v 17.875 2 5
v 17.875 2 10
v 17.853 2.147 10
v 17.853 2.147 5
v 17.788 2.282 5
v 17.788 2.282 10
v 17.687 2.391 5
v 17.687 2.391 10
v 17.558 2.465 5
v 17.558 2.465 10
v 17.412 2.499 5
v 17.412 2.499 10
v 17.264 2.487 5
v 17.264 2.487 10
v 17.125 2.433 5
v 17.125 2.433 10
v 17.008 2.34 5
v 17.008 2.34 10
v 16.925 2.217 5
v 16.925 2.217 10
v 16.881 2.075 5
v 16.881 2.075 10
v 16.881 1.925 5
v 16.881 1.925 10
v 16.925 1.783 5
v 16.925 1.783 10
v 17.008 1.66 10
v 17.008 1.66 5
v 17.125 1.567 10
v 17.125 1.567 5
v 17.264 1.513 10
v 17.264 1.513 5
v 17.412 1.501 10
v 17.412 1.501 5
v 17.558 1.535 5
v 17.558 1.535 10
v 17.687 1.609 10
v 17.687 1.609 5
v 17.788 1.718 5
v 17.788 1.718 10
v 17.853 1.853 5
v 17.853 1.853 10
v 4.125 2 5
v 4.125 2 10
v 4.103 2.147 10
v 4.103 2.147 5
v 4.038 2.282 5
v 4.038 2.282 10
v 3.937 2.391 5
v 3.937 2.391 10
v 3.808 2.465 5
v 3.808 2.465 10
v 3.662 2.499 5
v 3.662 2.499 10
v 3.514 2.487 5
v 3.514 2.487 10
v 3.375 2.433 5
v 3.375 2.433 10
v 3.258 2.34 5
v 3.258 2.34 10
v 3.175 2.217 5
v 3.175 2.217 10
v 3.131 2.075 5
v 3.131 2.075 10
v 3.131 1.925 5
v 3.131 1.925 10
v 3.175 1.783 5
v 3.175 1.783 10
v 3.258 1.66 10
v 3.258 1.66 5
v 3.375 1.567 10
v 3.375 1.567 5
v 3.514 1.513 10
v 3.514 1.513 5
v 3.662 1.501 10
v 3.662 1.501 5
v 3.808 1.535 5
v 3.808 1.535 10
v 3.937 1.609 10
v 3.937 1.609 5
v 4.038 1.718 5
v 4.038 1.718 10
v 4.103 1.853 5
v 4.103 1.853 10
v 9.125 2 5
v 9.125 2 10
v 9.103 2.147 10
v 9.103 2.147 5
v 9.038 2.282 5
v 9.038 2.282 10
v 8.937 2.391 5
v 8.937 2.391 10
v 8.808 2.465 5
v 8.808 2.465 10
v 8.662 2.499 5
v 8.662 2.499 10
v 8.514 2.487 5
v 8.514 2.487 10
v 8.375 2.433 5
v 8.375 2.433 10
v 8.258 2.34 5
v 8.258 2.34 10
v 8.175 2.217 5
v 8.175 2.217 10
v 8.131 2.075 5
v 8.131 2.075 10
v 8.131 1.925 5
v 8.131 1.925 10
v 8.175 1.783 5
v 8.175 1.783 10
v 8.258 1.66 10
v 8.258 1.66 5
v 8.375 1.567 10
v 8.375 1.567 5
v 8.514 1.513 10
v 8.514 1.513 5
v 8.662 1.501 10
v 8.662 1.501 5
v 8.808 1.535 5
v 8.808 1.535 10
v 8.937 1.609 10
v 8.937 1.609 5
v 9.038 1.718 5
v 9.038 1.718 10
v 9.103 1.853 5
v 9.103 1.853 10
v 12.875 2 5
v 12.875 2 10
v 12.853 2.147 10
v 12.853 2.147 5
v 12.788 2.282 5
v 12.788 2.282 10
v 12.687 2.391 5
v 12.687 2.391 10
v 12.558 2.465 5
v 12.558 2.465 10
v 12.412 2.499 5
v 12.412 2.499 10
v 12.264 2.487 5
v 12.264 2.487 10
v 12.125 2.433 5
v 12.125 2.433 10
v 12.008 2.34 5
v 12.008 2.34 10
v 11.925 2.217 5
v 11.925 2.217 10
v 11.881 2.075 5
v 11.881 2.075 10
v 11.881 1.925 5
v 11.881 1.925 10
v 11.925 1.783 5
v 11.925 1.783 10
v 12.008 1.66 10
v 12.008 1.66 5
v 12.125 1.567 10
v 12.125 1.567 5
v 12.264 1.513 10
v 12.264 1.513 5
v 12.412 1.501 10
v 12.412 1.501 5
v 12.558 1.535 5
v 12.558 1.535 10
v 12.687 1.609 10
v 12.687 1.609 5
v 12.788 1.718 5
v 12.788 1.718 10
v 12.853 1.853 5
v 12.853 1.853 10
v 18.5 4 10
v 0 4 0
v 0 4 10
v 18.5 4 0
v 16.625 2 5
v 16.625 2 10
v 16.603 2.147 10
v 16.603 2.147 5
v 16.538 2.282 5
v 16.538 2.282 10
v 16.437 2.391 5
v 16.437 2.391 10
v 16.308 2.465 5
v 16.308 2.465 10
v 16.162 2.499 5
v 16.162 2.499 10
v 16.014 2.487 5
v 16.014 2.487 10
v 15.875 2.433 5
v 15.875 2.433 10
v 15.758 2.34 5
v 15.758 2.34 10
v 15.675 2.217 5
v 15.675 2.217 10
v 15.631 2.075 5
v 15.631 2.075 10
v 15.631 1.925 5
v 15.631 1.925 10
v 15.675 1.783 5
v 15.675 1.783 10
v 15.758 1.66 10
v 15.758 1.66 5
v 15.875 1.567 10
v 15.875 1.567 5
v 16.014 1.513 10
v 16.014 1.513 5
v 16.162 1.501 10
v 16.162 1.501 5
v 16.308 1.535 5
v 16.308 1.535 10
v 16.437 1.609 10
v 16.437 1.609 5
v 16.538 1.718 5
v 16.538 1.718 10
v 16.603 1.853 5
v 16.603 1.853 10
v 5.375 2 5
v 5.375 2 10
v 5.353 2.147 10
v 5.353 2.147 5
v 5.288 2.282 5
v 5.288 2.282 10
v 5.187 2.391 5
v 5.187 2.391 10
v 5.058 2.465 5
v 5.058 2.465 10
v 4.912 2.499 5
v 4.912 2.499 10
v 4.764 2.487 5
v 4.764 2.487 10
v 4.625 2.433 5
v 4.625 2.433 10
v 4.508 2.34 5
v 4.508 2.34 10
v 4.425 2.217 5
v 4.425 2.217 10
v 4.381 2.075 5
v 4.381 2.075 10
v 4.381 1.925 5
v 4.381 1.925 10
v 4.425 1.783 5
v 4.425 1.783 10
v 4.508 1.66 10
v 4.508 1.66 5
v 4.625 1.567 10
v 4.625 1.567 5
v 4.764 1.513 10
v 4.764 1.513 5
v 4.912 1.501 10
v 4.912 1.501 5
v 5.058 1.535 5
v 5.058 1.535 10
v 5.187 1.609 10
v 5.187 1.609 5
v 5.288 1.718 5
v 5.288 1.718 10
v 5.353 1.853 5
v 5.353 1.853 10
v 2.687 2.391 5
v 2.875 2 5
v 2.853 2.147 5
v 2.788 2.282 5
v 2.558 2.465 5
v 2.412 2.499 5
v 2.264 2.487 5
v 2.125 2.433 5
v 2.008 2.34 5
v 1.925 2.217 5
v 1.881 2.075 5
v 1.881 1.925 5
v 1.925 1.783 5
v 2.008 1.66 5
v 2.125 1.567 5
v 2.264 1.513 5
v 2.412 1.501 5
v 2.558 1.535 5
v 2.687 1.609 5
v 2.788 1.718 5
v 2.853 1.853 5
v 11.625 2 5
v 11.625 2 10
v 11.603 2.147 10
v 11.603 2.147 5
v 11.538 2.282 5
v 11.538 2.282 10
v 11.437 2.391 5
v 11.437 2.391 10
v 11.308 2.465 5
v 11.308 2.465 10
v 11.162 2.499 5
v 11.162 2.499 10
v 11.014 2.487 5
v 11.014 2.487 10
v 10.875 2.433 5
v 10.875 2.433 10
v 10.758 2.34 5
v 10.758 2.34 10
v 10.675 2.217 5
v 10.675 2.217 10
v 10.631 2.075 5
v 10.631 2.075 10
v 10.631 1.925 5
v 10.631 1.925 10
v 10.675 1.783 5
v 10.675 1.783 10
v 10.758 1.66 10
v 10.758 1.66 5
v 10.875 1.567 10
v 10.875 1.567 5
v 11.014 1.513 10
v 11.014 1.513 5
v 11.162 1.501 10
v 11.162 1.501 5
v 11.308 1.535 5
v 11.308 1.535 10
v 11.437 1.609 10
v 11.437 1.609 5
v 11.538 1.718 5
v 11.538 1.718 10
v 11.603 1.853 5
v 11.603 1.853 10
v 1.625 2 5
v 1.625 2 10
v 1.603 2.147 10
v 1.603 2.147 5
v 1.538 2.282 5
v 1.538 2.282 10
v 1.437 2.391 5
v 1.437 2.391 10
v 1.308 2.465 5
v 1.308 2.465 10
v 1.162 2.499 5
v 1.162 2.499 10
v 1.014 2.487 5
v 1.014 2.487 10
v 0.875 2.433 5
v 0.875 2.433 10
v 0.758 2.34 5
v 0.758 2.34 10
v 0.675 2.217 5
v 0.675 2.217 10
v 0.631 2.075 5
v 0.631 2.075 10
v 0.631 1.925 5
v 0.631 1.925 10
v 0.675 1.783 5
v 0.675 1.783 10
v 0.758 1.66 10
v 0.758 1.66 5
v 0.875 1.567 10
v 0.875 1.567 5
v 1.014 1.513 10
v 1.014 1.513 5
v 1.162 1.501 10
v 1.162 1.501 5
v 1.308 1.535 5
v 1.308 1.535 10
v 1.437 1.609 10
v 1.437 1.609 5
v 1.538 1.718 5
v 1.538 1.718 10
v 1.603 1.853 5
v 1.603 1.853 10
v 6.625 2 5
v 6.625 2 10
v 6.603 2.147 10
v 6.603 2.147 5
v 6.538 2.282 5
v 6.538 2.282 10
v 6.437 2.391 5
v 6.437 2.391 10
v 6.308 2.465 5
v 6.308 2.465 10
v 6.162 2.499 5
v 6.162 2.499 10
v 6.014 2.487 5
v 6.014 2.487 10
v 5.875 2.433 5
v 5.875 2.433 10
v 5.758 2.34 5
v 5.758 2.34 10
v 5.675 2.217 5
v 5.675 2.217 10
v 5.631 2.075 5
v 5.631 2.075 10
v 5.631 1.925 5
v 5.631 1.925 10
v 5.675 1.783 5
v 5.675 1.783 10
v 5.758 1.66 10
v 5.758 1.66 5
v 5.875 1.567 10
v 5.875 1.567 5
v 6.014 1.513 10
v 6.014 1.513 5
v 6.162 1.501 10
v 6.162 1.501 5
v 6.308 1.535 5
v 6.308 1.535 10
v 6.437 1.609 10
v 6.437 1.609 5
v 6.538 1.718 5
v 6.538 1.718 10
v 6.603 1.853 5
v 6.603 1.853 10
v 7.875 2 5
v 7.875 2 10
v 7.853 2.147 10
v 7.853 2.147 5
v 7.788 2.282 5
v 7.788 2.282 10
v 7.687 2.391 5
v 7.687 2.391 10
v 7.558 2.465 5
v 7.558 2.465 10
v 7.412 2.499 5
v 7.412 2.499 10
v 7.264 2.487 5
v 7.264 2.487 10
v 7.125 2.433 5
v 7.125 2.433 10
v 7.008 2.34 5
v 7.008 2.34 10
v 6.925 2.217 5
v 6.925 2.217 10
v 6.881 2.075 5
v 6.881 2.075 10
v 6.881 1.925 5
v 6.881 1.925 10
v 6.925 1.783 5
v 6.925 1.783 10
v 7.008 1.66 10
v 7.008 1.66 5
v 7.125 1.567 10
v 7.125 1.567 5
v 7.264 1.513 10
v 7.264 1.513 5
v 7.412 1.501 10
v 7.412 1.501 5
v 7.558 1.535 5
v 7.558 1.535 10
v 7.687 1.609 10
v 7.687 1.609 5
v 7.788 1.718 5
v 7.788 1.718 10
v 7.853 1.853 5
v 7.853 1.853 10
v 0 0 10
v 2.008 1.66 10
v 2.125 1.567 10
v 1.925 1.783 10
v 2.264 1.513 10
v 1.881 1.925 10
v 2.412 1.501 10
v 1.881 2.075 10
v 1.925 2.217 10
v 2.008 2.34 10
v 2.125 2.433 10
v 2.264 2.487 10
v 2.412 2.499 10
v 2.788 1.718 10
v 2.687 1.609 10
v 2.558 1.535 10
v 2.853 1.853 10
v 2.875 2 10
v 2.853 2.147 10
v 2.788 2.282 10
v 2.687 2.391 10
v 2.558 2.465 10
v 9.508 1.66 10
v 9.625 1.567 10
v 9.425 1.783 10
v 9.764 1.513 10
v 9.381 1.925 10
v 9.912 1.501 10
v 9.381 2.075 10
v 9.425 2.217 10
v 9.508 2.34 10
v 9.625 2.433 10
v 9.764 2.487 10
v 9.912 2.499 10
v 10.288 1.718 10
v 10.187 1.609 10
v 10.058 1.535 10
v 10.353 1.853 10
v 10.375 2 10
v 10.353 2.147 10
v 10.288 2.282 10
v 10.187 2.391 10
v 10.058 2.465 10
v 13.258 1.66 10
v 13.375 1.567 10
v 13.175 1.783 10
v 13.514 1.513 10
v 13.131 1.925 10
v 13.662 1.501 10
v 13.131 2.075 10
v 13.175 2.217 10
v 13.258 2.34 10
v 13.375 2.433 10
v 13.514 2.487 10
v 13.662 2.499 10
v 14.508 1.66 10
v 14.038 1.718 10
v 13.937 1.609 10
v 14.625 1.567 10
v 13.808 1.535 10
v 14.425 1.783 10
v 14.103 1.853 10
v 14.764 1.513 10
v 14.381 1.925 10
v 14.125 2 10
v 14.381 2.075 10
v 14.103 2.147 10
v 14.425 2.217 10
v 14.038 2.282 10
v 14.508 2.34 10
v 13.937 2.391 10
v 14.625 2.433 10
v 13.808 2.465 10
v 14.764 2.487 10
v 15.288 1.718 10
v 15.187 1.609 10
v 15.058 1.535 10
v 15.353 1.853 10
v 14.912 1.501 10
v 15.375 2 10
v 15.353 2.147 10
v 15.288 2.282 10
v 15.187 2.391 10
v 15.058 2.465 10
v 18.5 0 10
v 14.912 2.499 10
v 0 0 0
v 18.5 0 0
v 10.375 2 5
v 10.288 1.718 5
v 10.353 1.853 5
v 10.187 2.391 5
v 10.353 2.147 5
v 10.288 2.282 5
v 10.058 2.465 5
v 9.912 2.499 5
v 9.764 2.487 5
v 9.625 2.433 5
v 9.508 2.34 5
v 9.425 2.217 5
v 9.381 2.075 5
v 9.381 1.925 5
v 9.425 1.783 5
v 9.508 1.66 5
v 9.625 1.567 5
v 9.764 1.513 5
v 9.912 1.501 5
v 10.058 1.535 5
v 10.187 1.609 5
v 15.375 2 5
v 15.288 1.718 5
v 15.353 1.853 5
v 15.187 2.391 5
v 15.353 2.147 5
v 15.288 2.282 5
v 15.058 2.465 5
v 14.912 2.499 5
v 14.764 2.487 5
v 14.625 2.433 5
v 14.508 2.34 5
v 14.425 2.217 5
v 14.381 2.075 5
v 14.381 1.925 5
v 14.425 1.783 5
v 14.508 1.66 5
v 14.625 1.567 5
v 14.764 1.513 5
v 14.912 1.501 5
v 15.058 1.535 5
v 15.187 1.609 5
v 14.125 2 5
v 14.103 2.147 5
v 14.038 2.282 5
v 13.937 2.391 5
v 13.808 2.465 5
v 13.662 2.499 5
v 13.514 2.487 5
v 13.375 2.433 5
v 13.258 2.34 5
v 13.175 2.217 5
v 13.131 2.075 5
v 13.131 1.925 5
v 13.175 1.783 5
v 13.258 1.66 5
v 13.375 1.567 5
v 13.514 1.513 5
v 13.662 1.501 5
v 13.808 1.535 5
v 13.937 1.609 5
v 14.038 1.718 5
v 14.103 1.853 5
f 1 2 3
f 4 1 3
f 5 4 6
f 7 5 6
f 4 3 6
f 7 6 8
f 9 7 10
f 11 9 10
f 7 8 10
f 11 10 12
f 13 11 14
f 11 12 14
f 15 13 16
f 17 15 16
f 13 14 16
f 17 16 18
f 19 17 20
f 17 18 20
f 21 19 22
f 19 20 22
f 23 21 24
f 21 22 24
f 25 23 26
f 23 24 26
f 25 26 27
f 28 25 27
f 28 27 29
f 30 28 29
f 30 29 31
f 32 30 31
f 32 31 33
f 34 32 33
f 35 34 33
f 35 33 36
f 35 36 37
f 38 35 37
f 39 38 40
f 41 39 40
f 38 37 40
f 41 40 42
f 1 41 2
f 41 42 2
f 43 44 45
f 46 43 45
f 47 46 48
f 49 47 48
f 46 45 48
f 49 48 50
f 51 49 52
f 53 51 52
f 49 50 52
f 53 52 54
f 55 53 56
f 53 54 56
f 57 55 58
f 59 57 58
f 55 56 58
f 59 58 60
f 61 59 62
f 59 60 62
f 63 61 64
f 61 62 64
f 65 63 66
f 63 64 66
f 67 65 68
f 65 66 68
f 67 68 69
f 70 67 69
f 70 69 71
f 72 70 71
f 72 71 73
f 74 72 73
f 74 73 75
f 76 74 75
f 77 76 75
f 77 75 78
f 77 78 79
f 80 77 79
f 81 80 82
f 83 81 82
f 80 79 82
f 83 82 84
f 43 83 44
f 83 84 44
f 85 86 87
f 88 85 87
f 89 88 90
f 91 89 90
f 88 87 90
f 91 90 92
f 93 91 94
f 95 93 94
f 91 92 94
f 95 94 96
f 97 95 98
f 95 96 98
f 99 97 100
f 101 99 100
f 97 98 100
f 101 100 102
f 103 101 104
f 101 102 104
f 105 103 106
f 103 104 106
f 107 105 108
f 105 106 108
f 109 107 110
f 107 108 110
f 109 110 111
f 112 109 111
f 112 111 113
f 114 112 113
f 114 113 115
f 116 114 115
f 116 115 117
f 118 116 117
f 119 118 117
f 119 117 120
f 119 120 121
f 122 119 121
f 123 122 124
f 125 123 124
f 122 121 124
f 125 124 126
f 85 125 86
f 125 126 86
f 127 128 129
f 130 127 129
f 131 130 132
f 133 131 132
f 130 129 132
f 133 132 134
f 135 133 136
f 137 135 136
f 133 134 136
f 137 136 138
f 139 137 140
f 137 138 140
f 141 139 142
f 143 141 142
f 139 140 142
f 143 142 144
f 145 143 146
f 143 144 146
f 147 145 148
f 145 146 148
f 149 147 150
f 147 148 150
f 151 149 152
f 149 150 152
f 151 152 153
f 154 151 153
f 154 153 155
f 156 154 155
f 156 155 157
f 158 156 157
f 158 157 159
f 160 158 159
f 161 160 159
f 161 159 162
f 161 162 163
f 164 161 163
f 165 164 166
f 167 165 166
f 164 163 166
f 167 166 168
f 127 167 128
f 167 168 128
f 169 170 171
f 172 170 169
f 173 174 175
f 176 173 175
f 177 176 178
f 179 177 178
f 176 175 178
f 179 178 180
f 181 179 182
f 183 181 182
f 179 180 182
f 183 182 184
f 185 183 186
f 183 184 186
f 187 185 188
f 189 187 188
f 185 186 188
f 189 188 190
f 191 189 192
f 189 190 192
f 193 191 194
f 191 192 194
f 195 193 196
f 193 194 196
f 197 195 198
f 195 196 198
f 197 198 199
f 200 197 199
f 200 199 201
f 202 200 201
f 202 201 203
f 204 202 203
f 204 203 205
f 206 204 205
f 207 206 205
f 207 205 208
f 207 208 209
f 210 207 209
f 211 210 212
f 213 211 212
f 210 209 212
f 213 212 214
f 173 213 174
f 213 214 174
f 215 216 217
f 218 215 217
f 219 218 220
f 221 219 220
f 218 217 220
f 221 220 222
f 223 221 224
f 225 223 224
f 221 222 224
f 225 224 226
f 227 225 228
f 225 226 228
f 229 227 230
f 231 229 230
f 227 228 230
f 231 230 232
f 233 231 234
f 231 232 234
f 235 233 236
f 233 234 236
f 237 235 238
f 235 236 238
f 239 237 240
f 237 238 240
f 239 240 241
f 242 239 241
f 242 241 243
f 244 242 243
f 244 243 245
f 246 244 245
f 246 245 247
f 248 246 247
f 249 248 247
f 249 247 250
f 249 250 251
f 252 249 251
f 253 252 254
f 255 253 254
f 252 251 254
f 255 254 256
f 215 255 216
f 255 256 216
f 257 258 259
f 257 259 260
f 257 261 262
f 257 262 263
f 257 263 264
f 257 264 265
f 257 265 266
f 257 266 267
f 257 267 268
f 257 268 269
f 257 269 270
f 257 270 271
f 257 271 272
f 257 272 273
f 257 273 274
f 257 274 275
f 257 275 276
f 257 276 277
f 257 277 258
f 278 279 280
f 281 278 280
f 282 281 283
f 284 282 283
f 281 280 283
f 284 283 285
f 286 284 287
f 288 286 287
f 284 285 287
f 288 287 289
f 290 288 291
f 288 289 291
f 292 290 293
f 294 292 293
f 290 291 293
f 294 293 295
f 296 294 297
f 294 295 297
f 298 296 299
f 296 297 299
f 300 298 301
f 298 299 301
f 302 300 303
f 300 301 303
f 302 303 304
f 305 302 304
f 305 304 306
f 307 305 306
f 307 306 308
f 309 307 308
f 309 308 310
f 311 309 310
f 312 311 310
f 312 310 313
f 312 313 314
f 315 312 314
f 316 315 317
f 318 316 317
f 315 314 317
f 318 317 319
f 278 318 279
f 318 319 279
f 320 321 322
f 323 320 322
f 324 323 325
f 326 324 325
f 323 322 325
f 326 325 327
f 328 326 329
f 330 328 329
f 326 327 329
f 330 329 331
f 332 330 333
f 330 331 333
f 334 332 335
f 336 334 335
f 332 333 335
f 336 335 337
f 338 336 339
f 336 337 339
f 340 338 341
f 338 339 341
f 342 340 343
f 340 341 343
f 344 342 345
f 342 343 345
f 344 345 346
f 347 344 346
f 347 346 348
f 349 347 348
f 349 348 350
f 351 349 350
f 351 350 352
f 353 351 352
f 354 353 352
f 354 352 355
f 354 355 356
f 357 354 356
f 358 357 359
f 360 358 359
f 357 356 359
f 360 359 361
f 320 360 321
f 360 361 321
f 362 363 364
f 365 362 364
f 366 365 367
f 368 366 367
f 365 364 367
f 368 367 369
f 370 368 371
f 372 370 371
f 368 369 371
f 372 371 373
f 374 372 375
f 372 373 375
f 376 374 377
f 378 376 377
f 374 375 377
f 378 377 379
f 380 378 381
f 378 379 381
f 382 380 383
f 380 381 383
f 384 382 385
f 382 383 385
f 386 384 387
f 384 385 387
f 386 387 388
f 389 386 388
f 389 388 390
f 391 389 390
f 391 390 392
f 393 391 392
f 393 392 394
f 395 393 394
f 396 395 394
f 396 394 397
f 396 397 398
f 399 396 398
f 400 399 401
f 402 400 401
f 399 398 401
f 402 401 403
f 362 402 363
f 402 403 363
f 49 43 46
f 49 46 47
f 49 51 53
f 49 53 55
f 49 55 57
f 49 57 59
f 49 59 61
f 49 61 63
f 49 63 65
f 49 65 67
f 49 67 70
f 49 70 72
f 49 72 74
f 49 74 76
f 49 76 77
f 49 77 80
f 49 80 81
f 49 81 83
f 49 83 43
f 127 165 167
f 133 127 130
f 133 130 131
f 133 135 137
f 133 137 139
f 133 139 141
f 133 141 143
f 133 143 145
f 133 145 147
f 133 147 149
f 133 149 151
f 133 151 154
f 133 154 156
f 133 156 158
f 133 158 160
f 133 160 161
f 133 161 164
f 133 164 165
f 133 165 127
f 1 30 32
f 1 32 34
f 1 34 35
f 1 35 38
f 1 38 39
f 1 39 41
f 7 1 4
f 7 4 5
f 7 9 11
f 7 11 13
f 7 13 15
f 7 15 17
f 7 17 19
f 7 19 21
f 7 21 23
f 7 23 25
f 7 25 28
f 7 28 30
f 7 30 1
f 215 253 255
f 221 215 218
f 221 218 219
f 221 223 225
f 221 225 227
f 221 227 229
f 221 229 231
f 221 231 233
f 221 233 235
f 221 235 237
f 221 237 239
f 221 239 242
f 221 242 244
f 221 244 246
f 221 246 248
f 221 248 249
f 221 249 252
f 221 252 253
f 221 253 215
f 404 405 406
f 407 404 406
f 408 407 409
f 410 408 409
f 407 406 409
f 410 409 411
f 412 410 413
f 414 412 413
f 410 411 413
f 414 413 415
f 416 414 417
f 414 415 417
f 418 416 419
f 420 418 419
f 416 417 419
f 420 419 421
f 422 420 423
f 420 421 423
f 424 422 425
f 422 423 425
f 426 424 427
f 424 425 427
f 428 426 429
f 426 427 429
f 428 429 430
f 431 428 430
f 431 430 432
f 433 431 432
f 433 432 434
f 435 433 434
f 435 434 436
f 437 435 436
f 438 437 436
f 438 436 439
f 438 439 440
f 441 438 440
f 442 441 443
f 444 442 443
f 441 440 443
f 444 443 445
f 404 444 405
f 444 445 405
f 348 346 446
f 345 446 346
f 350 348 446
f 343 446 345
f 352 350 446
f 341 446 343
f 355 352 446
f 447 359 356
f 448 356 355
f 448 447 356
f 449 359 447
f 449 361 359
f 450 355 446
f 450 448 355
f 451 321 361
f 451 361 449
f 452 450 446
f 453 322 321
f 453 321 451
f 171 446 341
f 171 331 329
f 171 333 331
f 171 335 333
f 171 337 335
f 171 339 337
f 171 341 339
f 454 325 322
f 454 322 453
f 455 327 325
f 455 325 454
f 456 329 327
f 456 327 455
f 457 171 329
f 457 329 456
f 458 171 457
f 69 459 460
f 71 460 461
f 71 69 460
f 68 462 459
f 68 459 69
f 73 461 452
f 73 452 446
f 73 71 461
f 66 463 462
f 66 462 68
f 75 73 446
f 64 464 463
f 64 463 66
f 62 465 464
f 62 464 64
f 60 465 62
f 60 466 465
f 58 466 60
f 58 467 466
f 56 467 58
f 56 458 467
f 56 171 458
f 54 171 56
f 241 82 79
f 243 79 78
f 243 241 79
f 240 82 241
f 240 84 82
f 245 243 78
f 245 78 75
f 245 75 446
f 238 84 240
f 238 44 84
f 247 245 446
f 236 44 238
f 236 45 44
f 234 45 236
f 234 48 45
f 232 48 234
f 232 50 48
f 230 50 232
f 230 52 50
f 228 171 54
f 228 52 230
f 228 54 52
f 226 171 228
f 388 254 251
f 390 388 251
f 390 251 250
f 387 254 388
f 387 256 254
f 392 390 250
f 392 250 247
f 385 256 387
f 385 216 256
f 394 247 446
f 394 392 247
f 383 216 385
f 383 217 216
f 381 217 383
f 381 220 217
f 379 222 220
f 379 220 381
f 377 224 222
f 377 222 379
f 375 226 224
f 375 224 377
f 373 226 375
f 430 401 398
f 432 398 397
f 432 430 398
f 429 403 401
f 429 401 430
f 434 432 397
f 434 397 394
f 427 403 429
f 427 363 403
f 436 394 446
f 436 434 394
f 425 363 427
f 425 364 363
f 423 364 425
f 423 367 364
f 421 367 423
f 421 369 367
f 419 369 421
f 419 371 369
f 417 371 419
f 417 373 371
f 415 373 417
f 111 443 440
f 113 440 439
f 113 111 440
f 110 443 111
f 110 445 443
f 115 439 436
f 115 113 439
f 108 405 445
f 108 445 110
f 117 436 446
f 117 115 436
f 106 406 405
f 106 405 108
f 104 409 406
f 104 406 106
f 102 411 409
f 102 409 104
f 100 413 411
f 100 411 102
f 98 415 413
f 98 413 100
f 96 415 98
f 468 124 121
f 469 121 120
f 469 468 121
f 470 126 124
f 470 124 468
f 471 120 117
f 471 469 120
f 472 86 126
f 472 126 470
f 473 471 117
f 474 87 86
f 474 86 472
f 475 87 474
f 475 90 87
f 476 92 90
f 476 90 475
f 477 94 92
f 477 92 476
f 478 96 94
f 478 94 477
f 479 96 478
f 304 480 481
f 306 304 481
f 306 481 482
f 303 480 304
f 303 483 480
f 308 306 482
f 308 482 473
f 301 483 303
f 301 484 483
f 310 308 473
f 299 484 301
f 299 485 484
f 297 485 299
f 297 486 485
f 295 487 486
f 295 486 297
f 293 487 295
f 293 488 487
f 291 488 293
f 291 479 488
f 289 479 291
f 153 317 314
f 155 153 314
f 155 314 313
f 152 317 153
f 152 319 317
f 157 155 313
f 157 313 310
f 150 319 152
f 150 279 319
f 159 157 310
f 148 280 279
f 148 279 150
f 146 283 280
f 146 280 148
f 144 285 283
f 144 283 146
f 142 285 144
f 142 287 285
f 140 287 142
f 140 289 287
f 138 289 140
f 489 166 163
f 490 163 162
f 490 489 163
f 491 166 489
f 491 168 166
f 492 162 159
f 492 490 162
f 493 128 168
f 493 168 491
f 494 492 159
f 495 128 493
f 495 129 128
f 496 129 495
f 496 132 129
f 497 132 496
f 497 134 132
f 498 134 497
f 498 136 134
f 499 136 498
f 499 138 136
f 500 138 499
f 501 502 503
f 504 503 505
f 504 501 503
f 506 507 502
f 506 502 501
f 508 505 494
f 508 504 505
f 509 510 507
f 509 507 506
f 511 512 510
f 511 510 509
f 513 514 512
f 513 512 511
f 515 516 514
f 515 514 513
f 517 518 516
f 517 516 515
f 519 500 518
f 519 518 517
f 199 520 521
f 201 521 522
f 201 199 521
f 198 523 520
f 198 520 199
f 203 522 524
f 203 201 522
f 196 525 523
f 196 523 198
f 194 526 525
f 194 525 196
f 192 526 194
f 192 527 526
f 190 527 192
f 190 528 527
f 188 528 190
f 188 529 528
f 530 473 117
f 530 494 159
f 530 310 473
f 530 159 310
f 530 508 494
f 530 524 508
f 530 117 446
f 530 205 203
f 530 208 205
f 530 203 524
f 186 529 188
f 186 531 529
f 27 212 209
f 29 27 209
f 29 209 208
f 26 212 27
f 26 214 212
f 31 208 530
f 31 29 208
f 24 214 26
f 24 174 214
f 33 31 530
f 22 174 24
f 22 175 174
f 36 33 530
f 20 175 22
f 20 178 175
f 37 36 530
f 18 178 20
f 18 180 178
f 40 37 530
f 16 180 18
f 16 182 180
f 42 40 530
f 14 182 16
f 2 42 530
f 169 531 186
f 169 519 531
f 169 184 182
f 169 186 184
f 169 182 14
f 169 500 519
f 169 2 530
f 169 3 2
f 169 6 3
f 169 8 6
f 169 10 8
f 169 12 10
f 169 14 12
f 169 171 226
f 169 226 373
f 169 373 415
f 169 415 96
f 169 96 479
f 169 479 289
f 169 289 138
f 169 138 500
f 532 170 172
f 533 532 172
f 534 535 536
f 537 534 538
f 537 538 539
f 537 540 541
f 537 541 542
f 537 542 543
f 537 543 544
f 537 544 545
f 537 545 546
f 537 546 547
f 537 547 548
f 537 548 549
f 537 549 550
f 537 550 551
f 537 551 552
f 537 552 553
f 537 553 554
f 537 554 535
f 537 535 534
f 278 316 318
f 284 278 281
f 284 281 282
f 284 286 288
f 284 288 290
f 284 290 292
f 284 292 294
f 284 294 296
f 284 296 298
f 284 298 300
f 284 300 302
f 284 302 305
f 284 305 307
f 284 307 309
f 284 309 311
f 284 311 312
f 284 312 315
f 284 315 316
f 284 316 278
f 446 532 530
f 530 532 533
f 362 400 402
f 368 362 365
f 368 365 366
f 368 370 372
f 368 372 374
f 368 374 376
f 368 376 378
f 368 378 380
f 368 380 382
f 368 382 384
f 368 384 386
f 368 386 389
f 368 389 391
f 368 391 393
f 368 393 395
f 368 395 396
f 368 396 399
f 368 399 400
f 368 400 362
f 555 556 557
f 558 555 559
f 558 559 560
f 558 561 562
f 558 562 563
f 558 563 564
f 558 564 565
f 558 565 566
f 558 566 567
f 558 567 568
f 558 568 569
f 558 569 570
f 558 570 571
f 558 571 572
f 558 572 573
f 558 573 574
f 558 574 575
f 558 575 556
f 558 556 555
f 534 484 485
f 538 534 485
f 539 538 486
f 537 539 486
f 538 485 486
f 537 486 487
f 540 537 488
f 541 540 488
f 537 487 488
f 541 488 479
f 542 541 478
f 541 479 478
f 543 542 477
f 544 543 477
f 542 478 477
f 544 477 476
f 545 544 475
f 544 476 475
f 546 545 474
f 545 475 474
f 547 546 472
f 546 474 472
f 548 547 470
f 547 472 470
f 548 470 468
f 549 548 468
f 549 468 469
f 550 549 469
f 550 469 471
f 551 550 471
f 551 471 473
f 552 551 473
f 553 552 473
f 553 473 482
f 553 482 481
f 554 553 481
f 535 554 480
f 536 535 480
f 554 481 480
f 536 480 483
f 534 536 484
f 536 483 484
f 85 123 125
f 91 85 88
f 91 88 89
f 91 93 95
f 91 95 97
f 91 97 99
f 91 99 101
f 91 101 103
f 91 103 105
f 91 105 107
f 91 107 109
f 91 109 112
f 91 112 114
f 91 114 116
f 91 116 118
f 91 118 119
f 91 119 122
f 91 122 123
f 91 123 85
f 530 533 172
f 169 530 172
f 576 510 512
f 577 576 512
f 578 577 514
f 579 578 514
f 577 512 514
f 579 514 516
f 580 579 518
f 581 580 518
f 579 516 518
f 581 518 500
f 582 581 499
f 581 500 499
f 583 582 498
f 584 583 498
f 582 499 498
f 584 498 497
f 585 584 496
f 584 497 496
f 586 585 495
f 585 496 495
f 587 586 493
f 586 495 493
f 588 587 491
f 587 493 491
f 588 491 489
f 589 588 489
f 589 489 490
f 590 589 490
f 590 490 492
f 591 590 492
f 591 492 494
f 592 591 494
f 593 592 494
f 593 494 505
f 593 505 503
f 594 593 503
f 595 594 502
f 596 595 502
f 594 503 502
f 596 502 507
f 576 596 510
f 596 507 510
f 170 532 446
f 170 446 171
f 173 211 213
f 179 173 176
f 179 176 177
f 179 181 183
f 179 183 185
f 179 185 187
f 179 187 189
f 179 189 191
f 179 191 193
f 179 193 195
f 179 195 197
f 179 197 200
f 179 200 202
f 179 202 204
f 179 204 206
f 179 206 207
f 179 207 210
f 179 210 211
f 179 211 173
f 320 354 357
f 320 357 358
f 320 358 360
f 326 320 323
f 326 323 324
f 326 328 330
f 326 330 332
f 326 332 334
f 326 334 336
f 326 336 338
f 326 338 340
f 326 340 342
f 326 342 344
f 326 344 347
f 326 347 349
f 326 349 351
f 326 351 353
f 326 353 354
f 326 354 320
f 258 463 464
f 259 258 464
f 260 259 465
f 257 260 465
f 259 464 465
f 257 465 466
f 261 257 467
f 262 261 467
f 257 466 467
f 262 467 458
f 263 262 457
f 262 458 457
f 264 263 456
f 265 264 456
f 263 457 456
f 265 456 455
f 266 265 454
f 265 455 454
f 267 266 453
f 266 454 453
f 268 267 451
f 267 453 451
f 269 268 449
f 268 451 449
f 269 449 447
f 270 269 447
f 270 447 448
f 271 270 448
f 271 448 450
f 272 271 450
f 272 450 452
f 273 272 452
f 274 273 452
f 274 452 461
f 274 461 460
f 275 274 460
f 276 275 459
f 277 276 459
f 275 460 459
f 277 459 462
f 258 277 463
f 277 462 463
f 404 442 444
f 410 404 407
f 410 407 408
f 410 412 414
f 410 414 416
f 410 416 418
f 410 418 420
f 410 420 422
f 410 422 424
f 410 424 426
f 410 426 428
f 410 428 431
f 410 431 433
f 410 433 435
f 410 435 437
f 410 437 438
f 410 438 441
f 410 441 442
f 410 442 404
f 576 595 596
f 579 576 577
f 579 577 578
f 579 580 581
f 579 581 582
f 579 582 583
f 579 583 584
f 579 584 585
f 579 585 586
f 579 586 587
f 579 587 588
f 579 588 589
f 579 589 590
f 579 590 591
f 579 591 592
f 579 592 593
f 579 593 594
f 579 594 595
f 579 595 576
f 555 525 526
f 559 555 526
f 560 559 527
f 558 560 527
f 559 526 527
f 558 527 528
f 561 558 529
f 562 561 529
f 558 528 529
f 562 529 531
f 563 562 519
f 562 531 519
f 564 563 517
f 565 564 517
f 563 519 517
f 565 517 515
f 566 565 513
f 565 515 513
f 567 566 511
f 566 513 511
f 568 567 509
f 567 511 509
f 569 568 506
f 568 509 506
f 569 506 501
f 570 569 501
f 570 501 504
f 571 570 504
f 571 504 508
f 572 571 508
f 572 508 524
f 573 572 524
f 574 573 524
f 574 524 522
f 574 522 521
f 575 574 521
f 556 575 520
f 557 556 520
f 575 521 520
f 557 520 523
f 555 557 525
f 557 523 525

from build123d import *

# Parameters (mm, degrees)
SKETCH2_W           = 18.5
SKETCH2_H           = 4
BOSS_EXTRUDE1_DEPTH = 10
SKETCH3_R           = 0.5
CUT_EXTRUDE1_DEPTH  = 5


with BuildPart() as part:
    # Sketch2 → Boss-Extrude1 (new body)
    with BuildSketch(Plane.XY):
        with Locations((9.25, 2)):
            Rectangle(SKETCH2_W, SKETCH2_H)
    extrude(amount=BOSS_EXTRUDE1_DEPTH)

    # Sketch3 → Cut-Extrude1 (cut)
    with BuildSketch(Plane.XY.offset(10)):
        with Locations((1.125, 2)):
            Circle(SKETCH3_R)
        with Locations((2.375, 2)):
            Circle(SKETCH3_R)
        with Locations((3.625, 2)):
            Circle(SKETCH3_R)
        with Locations((4.875, 2)):
            Circle(SKETCH3_R)
        with Locations((6.125, 2)):
            Circle(SKETCH3_R)
        with Locations((7.375, 2)):
            Circle(SKETCH3_R)
        with Locations((8.625, 2)):
            Circle(SKETCH3_R)
        with Locations((9.875, 2)):
            Circle(SKETCH3_R)
        with Locations((11.125, 2)):
            Circle(SKETCH3_R)
        with Locations((12.375, 2)):
            Circle(SKETCH3_R)
        with Locations((13.625, 2)):
            Circle(SKETCH3_R)
        with Locations((14.875, 2)):
            Circle(SKETCH3_R)
        with Locations((16.125, 2)):
            Circle(SKETCH3_R)
        with Locations((17.375, 2)):
            Circle(SKETCH3_R)
    extrude(amount=-CUT_EXTRUDE1_DEPTH, mode=Mode.SUBTRACT)


solid = part.part
